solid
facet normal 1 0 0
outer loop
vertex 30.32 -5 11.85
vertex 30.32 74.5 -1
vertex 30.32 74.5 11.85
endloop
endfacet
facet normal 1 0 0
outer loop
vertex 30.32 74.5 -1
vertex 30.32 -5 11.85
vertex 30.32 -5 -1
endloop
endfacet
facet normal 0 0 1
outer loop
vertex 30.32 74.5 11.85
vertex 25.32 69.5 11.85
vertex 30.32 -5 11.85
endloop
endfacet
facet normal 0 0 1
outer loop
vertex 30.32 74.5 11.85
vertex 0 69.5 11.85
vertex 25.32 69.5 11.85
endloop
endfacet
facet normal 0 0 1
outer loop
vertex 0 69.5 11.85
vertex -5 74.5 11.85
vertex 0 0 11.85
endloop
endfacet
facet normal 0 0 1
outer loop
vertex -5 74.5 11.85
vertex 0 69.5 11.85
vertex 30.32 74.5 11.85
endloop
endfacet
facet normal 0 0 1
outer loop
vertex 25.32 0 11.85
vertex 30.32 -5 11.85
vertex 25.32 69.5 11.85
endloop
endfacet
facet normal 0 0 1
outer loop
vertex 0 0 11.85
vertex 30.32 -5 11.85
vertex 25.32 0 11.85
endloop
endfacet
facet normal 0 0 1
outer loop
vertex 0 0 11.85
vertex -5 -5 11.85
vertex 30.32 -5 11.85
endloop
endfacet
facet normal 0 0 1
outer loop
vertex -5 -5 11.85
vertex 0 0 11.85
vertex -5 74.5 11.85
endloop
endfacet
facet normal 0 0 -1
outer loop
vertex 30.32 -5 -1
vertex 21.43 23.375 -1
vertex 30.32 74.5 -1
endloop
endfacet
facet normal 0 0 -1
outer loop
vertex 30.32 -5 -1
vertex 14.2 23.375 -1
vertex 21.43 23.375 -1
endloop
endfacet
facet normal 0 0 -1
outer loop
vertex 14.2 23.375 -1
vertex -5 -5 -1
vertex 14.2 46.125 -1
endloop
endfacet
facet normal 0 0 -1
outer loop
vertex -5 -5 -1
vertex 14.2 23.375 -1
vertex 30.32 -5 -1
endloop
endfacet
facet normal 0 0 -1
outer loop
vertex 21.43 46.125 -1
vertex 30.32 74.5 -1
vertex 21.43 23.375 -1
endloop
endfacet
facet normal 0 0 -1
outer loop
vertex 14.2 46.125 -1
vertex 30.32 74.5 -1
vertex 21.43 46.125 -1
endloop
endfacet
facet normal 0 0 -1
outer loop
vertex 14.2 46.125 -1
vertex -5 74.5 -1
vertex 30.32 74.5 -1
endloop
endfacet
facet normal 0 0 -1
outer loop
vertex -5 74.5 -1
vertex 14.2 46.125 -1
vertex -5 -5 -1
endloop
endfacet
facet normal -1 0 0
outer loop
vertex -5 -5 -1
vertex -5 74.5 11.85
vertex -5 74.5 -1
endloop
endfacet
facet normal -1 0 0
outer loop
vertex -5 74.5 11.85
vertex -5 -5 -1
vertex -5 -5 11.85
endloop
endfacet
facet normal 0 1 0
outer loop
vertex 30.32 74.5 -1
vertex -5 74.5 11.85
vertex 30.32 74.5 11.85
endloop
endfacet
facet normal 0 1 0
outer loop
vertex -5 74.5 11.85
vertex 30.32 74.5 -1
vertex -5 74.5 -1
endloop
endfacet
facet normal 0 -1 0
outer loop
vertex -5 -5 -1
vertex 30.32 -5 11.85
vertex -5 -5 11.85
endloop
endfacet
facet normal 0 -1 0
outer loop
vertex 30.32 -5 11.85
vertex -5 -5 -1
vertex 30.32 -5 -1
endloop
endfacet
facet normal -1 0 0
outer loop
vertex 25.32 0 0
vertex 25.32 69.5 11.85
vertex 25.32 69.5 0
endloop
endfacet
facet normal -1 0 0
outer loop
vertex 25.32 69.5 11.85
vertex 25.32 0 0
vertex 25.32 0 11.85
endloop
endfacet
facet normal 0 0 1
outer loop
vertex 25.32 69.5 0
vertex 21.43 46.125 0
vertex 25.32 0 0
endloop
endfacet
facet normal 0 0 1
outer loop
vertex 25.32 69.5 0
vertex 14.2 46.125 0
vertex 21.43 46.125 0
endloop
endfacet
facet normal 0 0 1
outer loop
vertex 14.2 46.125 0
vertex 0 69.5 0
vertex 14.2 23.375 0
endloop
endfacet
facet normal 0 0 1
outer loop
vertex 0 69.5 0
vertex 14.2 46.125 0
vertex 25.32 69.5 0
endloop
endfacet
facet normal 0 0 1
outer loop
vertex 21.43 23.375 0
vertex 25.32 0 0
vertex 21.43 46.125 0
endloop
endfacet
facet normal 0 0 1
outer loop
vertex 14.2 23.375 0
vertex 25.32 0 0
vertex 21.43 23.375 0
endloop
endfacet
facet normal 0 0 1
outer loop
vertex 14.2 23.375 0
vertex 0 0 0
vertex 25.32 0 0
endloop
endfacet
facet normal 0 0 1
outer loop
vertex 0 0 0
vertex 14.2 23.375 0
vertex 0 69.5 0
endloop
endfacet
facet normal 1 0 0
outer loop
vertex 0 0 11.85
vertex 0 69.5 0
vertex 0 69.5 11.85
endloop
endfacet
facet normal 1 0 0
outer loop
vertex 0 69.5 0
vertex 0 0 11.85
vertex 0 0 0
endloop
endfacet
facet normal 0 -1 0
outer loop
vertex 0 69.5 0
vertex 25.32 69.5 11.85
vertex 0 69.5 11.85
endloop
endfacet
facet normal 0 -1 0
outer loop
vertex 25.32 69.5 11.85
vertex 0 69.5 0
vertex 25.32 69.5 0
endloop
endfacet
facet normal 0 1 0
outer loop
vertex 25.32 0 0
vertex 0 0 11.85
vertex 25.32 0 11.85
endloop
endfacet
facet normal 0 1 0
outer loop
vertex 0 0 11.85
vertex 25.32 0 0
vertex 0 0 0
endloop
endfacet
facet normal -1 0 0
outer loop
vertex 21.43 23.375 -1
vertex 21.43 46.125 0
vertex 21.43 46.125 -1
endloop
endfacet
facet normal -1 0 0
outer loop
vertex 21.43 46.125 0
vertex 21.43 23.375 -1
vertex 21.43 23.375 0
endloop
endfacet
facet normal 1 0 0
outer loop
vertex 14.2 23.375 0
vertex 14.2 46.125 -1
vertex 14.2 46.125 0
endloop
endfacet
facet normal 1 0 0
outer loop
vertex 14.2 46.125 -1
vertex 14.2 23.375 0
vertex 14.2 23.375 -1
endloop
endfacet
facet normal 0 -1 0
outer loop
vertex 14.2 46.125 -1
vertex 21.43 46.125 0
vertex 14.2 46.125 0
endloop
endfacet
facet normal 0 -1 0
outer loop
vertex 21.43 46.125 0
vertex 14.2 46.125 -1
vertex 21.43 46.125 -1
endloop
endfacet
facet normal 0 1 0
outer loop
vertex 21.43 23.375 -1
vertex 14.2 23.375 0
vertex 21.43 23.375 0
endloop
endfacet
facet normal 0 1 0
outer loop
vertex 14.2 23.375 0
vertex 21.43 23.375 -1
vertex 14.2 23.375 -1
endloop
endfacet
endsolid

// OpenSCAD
depth = 25.32;
breadth = 69.5;
trough = 11.85;

back =6.97;
front= 11.12;
pins = 22.75;

base = 1;
length = breadth + 10;
width = depth + 10;

difference() {
    translate([-(length-breadth)/2,-(width-depth)/2,-base]) cube([width, length, base+trough]);

    cube([depth, breadth, trough]);

    translate([depth-front,breadth/2-pins/2,-base]) cube([depth-back-front, pins, base]);
}
